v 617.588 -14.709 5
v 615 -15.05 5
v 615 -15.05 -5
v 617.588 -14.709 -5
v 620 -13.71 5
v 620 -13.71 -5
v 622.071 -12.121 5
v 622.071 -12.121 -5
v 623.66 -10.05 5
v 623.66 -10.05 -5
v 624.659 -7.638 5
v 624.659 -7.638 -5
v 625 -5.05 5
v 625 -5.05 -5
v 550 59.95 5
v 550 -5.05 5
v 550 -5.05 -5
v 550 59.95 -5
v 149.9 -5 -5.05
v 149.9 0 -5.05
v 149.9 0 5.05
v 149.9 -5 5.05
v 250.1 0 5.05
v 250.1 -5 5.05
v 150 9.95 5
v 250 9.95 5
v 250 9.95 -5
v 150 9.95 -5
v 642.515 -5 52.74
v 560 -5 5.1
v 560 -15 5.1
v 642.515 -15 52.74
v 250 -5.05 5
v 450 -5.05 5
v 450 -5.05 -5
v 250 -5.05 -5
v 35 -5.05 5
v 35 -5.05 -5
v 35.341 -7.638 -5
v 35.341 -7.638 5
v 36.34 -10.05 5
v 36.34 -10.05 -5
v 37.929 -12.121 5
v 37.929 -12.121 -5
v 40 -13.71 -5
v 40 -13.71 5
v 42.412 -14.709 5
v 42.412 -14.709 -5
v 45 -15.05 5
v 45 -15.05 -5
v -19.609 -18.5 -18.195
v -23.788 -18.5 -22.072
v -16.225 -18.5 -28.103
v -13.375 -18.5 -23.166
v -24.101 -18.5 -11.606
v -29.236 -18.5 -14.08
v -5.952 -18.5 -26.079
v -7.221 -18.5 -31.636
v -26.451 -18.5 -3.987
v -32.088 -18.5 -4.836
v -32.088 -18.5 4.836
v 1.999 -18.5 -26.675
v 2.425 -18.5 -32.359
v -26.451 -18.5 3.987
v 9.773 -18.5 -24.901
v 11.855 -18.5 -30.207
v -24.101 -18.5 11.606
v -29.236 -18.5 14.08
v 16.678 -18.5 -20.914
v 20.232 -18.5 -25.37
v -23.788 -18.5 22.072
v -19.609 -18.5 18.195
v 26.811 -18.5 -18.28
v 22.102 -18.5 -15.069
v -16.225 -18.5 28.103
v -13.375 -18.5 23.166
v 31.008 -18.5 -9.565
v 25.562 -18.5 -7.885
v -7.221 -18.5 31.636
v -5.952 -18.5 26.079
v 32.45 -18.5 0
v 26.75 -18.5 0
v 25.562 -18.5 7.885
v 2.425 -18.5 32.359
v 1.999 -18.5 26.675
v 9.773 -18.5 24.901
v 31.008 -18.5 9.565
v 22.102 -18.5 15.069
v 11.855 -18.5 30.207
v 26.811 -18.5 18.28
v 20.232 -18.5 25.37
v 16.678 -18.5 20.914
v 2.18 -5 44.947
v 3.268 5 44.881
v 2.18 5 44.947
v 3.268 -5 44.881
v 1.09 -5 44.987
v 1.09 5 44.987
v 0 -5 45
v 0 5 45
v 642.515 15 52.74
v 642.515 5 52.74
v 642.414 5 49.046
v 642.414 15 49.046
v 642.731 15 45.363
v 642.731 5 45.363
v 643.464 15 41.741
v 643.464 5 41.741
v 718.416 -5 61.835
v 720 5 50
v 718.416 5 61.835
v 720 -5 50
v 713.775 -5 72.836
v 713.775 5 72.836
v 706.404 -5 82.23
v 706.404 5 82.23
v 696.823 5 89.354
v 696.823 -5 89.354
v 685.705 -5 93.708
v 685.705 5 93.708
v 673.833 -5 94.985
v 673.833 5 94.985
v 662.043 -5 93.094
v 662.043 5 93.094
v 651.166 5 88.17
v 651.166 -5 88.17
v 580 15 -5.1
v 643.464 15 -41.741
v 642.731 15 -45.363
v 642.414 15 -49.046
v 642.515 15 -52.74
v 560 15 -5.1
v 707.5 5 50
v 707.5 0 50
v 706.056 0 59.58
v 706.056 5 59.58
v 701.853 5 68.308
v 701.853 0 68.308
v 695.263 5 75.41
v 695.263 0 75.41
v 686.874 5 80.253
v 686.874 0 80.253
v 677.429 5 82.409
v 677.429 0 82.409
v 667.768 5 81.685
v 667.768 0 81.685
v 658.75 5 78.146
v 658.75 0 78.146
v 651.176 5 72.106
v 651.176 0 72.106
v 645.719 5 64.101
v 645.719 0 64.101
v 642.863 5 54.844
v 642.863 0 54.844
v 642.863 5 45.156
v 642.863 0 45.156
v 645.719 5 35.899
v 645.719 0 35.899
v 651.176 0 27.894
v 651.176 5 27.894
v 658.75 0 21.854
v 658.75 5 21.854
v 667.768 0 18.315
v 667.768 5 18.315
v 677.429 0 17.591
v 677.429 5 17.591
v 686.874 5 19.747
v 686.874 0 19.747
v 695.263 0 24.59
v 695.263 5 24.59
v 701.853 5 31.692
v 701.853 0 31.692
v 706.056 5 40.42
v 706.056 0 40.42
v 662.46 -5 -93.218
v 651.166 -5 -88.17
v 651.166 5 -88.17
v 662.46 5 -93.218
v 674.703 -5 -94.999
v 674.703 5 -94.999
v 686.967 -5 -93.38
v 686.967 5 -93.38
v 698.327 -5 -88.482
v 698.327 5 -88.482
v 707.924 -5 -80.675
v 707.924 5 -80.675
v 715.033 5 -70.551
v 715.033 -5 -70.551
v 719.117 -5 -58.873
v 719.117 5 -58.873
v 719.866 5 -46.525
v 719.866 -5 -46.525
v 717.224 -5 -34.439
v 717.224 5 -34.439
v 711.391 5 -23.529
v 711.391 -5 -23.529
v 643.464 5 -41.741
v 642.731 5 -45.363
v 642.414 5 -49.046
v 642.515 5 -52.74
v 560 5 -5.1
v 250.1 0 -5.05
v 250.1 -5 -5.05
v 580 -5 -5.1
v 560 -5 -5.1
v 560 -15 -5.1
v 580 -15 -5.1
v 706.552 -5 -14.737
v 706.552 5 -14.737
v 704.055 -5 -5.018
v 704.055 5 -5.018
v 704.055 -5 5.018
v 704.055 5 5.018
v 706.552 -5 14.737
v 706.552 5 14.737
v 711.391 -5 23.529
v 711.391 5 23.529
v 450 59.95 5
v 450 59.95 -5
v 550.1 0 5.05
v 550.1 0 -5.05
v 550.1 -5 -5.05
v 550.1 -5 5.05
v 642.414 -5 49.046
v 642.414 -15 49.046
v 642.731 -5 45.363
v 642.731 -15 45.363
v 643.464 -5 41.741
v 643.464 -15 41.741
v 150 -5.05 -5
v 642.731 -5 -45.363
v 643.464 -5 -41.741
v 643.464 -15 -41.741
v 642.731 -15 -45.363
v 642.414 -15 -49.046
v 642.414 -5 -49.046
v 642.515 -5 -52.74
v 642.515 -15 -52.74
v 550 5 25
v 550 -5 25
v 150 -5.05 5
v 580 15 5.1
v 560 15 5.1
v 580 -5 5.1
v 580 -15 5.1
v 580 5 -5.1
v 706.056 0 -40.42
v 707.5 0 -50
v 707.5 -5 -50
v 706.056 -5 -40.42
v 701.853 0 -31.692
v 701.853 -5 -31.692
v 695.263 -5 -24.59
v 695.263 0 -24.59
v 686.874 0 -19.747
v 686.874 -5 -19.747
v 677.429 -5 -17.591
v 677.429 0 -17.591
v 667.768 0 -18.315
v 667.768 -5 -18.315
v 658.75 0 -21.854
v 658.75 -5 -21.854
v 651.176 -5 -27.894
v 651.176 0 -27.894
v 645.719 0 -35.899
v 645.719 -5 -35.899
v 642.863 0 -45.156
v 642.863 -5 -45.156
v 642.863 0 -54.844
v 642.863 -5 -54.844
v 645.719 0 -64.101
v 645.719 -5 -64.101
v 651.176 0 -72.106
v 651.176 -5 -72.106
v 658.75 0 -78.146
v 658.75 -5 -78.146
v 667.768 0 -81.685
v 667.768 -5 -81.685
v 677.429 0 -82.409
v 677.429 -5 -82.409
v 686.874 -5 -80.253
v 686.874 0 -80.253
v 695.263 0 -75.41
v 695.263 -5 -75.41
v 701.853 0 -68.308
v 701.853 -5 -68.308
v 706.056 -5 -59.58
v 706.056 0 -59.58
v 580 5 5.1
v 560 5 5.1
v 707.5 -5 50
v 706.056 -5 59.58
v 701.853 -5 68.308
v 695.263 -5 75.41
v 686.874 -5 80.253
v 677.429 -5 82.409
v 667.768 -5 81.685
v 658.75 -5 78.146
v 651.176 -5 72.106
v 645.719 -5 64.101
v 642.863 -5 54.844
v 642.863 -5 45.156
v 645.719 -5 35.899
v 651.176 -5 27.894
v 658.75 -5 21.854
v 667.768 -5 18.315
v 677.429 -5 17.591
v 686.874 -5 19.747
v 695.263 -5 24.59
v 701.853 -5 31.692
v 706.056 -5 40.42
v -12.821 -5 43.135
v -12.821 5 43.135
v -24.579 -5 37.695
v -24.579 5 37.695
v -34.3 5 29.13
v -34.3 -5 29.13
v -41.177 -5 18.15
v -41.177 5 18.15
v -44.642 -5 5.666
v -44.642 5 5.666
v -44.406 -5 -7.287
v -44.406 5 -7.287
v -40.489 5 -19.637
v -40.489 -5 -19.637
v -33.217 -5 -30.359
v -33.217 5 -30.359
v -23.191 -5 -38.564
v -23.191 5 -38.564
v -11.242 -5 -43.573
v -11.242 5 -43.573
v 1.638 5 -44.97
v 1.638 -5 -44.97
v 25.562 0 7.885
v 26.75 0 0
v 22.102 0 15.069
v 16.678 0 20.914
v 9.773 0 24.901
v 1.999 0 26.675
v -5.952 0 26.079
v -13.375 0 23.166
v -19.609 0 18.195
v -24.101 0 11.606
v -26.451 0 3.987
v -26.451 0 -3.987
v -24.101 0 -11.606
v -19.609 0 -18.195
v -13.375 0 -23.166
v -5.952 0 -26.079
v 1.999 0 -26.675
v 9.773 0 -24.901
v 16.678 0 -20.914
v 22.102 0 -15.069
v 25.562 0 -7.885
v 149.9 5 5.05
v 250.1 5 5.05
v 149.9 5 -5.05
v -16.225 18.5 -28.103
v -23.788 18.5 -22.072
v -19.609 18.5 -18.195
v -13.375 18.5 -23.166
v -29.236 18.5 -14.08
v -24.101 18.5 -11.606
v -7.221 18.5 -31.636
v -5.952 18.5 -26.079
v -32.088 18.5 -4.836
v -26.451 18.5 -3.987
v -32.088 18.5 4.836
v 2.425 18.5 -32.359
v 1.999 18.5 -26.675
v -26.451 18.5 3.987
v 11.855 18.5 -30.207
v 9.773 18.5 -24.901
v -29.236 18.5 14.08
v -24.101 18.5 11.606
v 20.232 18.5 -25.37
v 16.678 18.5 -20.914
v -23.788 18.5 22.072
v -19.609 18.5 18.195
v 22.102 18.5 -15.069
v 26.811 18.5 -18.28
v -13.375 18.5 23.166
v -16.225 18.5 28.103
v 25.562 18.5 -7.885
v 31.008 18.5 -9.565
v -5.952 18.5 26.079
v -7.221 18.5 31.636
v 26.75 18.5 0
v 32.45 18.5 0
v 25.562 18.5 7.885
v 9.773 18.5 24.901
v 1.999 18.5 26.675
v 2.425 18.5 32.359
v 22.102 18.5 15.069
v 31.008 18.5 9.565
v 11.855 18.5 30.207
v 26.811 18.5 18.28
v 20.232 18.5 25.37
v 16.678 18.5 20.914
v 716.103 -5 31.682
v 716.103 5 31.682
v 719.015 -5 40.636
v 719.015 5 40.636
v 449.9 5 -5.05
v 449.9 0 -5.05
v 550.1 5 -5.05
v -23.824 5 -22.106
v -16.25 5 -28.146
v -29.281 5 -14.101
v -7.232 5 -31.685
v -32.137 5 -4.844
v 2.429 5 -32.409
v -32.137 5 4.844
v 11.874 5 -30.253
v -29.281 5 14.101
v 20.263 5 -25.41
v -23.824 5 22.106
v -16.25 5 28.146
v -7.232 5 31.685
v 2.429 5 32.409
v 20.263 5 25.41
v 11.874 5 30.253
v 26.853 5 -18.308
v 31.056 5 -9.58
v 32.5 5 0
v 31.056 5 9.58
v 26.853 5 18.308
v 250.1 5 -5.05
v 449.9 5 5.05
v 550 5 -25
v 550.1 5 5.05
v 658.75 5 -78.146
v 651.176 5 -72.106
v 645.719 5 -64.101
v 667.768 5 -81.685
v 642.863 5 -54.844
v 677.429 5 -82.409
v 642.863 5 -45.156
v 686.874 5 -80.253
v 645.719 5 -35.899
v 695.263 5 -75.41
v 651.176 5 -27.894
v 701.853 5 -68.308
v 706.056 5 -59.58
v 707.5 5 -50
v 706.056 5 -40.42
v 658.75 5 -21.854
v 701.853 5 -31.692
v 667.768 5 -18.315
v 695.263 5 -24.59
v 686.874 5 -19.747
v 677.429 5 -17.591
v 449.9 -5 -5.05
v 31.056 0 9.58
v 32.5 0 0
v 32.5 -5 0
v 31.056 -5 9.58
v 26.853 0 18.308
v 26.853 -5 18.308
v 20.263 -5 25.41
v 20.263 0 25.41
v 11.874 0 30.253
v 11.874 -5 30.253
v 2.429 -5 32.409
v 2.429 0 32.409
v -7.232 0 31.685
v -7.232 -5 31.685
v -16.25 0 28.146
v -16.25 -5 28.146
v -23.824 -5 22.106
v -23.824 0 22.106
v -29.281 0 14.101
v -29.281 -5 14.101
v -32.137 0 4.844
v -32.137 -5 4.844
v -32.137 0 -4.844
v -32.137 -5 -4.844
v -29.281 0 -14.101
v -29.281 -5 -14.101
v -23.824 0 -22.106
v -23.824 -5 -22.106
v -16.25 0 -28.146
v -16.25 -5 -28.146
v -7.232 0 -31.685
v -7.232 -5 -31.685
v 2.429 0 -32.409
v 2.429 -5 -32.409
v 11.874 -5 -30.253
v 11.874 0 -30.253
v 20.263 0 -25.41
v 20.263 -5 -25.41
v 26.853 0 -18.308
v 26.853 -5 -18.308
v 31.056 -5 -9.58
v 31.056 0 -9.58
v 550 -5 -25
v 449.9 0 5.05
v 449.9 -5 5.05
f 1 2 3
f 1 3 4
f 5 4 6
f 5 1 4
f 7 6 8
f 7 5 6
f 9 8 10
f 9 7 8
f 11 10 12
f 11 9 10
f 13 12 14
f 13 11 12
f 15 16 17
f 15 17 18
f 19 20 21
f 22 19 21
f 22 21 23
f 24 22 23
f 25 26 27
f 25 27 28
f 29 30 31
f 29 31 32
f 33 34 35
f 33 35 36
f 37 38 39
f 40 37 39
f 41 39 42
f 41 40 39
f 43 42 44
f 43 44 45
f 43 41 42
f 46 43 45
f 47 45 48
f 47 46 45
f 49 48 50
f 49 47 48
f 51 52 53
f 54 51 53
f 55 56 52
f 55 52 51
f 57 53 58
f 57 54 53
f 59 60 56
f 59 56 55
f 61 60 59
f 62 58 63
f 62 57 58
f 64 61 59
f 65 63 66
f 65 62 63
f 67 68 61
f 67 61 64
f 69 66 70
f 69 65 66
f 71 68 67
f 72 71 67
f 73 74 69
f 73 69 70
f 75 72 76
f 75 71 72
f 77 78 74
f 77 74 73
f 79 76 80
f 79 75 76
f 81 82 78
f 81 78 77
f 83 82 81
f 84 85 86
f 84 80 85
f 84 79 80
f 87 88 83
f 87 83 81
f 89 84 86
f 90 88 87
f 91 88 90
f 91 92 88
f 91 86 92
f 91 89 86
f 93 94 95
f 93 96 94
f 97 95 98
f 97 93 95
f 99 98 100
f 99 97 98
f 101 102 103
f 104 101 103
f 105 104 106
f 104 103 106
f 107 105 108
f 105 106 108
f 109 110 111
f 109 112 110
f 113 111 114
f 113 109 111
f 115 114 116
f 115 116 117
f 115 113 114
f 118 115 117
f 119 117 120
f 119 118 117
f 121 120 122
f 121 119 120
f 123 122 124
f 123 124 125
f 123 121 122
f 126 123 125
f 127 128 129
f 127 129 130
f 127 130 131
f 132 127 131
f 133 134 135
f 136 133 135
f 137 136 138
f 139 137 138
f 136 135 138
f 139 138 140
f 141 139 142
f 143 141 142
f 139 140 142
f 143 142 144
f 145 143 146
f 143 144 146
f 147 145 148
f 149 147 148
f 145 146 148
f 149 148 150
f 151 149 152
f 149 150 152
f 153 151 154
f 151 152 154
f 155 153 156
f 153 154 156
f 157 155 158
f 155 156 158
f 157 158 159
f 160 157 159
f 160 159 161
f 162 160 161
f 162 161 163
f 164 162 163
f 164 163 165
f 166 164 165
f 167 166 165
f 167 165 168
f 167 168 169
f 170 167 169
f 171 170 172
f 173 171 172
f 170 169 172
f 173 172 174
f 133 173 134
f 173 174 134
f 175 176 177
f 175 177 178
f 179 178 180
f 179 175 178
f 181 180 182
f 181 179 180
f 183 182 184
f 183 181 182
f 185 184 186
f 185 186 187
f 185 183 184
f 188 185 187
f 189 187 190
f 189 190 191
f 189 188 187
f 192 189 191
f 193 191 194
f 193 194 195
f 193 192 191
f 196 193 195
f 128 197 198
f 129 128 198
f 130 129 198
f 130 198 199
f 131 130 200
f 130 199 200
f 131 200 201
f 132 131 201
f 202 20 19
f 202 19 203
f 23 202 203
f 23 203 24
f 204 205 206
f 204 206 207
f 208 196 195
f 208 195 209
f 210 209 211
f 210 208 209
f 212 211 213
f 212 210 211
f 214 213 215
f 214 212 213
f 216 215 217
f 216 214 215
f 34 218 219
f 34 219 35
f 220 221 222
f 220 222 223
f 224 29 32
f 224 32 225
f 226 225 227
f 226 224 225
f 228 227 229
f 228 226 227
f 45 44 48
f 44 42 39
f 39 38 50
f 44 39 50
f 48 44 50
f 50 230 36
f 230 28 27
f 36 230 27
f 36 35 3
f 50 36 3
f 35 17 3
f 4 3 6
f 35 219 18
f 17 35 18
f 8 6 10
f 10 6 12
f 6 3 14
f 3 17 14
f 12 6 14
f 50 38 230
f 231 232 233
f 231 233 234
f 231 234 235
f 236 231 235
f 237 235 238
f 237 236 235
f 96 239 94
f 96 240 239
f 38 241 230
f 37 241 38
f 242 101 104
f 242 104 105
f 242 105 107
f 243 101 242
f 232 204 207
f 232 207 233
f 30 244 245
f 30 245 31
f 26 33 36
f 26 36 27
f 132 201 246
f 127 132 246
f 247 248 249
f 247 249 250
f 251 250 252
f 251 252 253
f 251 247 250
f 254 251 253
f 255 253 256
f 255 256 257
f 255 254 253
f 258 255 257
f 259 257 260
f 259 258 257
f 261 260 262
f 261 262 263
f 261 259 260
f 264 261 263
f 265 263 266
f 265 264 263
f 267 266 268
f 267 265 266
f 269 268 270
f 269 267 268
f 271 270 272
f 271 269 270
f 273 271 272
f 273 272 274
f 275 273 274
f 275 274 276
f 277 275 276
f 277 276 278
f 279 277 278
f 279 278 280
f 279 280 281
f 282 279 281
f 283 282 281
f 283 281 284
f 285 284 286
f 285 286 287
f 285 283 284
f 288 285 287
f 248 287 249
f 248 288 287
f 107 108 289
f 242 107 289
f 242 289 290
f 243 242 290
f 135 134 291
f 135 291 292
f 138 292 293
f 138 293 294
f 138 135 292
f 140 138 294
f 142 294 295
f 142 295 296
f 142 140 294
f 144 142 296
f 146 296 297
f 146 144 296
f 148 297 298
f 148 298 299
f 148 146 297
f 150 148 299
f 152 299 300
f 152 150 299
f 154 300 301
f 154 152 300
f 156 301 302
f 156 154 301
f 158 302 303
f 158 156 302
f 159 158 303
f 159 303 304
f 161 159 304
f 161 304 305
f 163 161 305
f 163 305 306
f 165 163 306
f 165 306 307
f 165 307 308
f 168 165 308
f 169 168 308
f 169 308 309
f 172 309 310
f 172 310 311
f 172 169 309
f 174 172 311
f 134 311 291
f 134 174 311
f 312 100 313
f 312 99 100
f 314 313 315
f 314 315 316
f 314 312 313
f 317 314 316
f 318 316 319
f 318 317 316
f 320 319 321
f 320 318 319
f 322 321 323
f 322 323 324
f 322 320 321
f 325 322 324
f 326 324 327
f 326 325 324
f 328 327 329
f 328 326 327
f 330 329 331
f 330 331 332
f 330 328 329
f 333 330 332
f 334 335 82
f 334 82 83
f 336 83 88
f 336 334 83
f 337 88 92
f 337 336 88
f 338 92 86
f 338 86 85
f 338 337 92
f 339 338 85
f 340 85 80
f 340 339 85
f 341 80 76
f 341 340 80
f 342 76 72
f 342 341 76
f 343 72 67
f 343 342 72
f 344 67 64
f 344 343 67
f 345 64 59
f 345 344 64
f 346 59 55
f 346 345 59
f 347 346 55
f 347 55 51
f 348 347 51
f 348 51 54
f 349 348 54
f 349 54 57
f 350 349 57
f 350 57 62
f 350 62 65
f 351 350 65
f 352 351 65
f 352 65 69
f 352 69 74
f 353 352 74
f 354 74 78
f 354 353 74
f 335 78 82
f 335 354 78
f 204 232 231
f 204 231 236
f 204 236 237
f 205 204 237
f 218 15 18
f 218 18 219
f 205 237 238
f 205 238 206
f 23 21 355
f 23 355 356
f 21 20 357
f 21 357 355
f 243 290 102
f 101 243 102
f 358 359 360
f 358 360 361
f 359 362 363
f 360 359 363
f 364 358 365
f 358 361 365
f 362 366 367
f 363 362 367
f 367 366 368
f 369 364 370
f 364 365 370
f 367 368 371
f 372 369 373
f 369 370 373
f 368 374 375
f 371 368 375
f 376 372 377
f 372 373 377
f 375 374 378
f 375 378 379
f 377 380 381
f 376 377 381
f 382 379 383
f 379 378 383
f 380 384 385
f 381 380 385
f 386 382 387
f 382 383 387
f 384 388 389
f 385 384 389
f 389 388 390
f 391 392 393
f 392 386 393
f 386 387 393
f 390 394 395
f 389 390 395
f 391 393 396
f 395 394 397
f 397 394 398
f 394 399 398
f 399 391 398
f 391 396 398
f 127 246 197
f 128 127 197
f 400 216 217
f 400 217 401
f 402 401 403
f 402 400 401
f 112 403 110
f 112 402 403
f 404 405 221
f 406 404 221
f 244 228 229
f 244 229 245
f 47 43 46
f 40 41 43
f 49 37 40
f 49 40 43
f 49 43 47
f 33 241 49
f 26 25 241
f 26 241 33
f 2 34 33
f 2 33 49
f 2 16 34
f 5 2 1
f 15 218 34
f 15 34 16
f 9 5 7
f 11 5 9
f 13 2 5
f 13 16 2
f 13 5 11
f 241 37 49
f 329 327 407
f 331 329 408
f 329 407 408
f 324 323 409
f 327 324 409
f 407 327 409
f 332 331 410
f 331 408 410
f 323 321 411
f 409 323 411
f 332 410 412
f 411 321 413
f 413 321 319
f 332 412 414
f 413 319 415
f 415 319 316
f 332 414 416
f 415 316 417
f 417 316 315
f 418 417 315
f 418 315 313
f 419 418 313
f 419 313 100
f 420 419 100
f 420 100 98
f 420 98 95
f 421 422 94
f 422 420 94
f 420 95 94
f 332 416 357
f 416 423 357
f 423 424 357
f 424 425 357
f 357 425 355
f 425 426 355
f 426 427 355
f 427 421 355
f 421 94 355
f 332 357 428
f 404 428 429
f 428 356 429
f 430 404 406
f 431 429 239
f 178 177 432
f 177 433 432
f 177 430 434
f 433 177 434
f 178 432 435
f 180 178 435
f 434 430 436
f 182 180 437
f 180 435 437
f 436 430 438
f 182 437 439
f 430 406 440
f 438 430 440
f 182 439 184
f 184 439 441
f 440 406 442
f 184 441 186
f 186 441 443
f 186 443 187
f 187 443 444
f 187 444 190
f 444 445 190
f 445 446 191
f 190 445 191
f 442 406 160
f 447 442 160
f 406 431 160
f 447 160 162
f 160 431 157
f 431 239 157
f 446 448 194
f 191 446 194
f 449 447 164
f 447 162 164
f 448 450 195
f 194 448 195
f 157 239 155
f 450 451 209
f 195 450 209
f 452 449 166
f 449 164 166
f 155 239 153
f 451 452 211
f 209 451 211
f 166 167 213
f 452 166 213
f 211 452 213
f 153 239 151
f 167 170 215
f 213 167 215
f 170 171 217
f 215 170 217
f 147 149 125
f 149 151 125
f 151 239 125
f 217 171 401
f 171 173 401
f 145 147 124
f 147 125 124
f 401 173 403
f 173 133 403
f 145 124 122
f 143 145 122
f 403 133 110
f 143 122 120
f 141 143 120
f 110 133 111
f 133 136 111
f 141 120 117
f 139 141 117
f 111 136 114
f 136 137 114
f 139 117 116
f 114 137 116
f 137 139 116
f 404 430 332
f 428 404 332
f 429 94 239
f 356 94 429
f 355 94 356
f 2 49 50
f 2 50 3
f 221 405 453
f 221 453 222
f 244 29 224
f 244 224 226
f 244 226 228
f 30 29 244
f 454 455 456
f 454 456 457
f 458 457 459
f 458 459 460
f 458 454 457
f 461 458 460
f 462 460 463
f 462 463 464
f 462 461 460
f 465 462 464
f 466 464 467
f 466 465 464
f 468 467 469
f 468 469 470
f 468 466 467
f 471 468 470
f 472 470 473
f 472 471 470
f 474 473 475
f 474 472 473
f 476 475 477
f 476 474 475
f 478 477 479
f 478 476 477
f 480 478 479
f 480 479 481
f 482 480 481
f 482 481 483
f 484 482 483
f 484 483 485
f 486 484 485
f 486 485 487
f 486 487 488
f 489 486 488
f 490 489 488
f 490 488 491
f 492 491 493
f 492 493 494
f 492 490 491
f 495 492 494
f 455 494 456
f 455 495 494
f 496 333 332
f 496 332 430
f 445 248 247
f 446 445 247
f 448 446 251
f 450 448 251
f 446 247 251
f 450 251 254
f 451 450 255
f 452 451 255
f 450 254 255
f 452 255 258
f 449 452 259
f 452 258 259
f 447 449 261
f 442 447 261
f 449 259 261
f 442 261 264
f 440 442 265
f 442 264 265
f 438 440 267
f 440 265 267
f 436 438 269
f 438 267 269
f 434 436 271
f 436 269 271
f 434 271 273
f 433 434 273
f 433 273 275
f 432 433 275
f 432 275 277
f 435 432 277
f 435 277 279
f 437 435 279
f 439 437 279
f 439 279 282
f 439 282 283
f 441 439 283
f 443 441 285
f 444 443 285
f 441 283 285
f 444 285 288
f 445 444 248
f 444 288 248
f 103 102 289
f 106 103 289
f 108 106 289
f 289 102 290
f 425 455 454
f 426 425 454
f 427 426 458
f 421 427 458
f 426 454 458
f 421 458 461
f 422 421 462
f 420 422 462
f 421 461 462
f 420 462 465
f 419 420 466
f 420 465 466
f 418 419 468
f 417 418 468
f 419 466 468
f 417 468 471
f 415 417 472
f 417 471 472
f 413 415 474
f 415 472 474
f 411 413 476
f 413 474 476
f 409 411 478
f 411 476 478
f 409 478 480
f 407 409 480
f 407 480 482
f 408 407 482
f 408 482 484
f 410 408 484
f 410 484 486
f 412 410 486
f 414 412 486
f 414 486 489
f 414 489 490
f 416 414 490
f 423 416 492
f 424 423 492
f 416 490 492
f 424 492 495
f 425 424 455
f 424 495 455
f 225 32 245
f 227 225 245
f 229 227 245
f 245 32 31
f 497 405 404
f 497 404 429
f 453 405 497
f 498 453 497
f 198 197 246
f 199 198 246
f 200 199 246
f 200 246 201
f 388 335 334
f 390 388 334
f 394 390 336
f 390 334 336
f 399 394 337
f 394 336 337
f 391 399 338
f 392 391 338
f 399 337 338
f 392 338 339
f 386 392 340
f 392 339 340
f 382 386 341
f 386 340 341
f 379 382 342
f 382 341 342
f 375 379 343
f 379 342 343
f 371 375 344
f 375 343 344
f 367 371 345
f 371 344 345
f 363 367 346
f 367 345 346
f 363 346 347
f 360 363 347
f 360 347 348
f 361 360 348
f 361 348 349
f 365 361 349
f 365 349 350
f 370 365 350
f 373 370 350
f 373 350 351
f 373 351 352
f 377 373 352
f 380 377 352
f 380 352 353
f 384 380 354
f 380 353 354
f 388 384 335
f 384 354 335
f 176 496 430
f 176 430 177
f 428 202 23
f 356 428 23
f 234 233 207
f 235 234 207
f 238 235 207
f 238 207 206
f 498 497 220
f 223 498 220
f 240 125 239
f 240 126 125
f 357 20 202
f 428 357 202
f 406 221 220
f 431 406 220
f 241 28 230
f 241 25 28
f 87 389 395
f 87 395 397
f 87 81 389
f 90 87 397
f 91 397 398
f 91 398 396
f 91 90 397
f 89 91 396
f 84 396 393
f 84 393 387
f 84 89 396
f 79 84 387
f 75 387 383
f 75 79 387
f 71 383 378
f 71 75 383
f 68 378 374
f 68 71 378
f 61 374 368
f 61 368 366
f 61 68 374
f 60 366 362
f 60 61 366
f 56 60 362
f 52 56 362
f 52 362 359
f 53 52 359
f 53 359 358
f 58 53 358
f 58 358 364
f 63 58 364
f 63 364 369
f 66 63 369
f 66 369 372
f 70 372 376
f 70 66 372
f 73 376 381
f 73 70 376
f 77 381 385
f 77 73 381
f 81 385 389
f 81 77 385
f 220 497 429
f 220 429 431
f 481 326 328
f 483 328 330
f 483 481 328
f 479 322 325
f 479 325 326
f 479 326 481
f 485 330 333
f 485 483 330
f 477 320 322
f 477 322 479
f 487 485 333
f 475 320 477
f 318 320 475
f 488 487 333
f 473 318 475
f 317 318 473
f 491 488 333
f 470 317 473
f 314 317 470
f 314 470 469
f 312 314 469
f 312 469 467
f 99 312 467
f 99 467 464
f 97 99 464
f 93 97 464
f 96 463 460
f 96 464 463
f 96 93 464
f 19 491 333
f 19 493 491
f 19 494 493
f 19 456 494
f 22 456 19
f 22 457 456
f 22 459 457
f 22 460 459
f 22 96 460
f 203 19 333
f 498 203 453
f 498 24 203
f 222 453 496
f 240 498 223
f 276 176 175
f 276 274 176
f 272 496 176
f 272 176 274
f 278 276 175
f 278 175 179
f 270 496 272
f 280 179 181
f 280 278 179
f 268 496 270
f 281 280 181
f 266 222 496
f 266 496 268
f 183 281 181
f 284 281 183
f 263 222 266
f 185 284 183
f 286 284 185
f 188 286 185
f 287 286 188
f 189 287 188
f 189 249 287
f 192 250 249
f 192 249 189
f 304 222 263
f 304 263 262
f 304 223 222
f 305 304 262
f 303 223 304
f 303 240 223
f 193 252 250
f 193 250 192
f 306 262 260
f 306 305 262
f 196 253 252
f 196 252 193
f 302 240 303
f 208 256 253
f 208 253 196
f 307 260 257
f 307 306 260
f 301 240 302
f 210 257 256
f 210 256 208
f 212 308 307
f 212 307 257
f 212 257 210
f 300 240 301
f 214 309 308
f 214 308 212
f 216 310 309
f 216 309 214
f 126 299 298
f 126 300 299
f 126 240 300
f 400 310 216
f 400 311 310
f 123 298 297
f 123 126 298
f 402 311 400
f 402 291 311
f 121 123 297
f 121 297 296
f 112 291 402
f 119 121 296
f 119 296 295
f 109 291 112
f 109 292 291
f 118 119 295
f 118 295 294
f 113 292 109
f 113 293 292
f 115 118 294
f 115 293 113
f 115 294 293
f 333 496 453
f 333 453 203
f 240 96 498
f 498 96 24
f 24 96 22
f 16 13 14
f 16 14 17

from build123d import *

# Parameters (mm, degrees)
F0_R          = 32.5
F0_W          = 100.2
F0_H          = 10.1
F1_DEPTH      = 5
F1_DEPTH_BACK = 5
F3_DEPTH      = 5
F3_DEPTH_BACK = 5
F5_DEPTH      = 10
F7_R          = 32.45
F7_R_2        = 26.75
F8_DEPTH      = 18.5
F8_DEPTH_BACK = 18.5


with BuildPart() as f1:
    # F0 (on Front) → F1 (new body, two sides)
    with BuildSketch(Plane.XZ) as f1_sk:
        with BuildLine():
            ThreePointArc((1.637721, -44.970189), (32.393652, -31.235417), (45, 0))
            ThreePointArc((45, 0), (32.955108, 30.642469), (3.268405, 44.881149))
            Line((3.268405, 44.881149), (0, 45))
            ThreePointArc((0, 45), (-44.992547, -0.818996), (1.637721, -44.970189))
        make_face()
        Circle(F0_R, mode=Mode.SUBTRACT)
        with BuildLine():
            ThreePointArc((3.268405, 44.881149), (32.955108, 30.642469), (45, 0))
            ThreePointArc((45, 0), (32.393652, -31.235417), (1.637721, -44.970189))
            Line((1.637721, -44.970189), (550, -25))
            Line((550, -25), (651.16602, -88.169902))
            ThreePointArc((651.16602, -88.169902), (707.924431, -80.675427), (711.391042, -23.529412))
            ThreePointArc((711.391042, -23.529412), (703.738635, 0), (711.391042, 23.529412))
            ThreePointArc((711.391042, 23.529412), (642.075569, 19.324573), (651.16602, 88.169902))
            Line((651.16602, 88.169902), (550, 25))
            Line((550, 25), (3.268405, 44.881149))
        make_face()
        with Locations((200, 0)):
            Rectangle(F0_W, F0_H, mode=Mode.SUBTRACT)
        with Locations((675, -50)):
            Circle(F0_R, mode=Mode.SUBTRACT)
        with Locations((500, 0)):
            Rectangle(F0_W, F0_H, mode=Mode.SUBTRACT)
        with BuildLine():
            Line((0, 45), (3.268405, 44.881149))
            ThreePointArc((3.268405, 44.881149), (1.635283, 44.970277), (0, 45))
        make_face()
        with BuildLine():
            ThreePointArc((720, 50), (696.822819, 89.354346), (651.16602, 88.169902))
            ThreePointArc((651.16602, 88.169902), (642.075569, 19.324573), (711.391042, 23.529412))
            ThreePointArc((711.391042, 23.529412), (717.793673, 36.08233), (720, 50))
        make_face()
        with Locations((675, 50)):
            Circle(F0_R, mode=Mode.SUBTRACT)
    extrude(amount=F1_DEPTH)
    extrude(f1_sk.sketch, amount=-F1_DEPTH_BACK)


with BuildPart() as f3:
    # F2 (on Top) → F3 (new body, two sides)
    with BuildSketch(Plane.XY) as f3_sk:
        with BuildLine():
            ThreePointArc((35, -5.05), (37.928932, -12.121068), (45, -15.05))
            Line((45, -15.05), (615, -15.05))
            ThreePointArc((615, -15.05), (622.071068, -12.121068), (625, -5.05))
            Line((625, -5.05), (550, -5.05))
            Line((550, -5.05), (550, 59.95))
            Line((550, 59.95), (450, 59.95))
            Line((450, 59.95), (450, -5.05))
            Line((450, -5.05), (250, -5.05))
            Line((250, -5.05), (250, 9.95))
            Line((250, 9.95), (150, 9.95))
            Line((150, 9.95), (150, -5.05))
            Line((150, -5.05), (35, -5.05))
        make_face()
    extrude(amount=F3_DEPTH)
    extrude(f3_sk.sketch, amount=-F3_DEPTH_BACK)


with BuildPart() as f5:
    # F4 (on face) → F5 (new body)
    with BuildSketch(Plane(origin=(0, 5, 0), x_dir=(-1, 0, 0), z_dir=(0, 1, 0))):
        with BuildLine():
            Line((-580, -5.1), (-643.463602, -41.740728))
            ThreePointArc((-643.463602, -41.740728), (-642.520462, -47.200068), (-642.515374, -52.740274))
            Line((-642.515374, -52.740274), (-560, -5.1))
            Line((-560, -5.1), (-580, -5.1))
        make_face()
        with BuildLine():
            Line((-643.463602, 41.740728), (-580, 5.1))
            Line((-580, 5.1), (-560, 5.1))
            Line((-560, 5.1), (-642.515374, 52.740274))
            ThreePointArc((-642.515374, 52.740274), (-642.520462, 47.200068), (-643.463602, 41.740728))
        make_face()
    extrude(amount=F5_DEPTH)


with BuildPart() as f6_1:
    # F6: instance of F5
    add(f5.part.mirror(Plane.XZ))


with BuildPart() as f8:
    # F7 (on Front) → F8 (new body, two sides)
    with BuildSketch(Plane.XZ) as f8_sk:
        Circle(F7_R)
        Circle(F7_R_2, mode=Mode.SUBTRACT)
    extrude(amount=F8_DEPTH)
    extrude(f8_sk.sketch, amount=-F8_DEPTH_BACK)


solid = Compound([f1.part, f3.part, f5.part, f6_1.part, f8.part])
